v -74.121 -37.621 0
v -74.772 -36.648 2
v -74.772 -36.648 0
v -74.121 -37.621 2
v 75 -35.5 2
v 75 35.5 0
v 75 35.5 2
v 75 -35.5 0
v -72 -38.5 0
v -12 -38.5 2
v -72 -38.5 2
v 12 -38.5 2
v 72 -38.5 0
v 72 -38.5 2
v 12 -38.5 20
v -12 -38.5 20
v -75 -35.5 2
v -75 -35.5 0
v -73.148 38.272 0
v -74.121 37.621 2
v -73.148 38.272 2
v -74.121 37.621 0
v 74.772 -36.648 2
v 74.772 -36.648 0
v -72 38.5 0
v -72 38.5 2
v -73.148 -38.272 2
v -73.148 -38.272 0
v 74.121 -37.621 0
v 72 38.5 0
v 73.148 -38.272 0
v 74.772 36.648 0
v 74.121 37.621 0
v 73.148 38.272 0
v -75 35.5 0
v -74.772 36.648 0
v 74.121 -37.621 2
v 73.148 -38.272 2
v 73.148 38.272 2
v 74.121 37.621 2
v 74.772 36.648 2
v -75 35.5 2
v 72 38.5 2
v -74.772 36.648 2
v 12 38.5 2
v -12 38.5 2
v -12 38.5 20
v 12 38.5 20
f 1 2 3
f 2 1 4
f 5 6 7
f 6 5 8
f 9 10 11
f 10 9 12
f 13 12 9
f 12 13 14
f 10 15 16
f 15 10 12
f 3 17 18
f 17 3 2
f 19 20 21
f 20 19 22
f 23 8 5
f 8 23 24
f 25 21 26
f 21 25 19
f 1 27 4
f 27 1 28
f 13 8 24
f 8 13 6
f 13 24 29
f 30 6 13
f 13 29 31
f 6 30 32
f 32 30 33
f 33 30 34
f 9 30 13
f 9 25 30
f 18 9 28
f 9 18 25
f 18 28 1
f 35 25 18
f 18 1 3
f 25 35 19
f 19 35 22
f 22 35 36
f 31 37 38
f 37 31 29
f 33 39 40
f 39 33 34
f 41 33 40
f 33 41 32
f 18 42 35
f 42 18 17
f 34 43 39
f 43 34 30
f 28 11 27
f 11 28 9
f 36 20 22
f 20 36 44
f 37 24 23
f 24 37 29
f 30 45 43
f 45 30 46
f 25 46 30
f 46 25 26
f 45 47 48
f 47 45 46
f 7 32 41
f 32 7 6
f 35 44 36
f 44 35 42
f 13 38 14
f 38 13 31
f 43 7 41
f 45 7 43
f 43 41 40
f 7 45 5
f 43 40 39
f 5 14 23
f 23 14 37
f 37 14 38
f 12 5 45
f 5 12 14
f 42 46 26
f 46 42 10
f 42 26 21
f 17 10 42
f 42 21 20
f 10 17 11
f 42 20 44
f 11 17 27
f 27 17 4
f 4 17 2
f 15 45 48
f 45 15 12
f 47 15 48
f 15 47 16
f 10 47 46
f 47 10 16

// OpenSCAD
// file: actuators/act_kickup.scad
include <../parameter.scad>
strSpanB=10;
bodySlotX=100;
diameter=16;

//kickup(3);
//cap();

module kickup(orient){
$fn=32;

wall=2;
coilZ=15;
bottomZ=2;
t=0.3;
ySpacing=12;

bX = slotXY;
bY=ySpacing+diameter+wall;
bZ=coilZ+bottomZ+t;

tX = bX;
tY=bY;
hub=3;
magZ=3.1;
tbottomZ=3;
tZ=hub+magZ+tbottomZ;
tDia=6.7;//6.5;
screwTdia=4.3;

conMntX=2.54;
conMntY=6.3;
conMntZ=12;
conWt=1.5;

screwMdia=3;
screwMHDia=5.5;
screwMHh=1.8;
screwAdia=4.3;

mntTh=3;
mX=bX+slotXY+mntTh+0.3;


module mnt(){
difference(){
    union(){
        translate([-mX/2+bX/2,0,-mntTh])rcube([mX,bY,mntTh],3);
        translate([-mX+bX/2+mntTh/2,0,-mntTh])rcube([mntTh,bY,bZ+mntTh+tZ],0.1);
    }
    hull(){
    translate([-bX/2-slotXY,0,slotXY/2])rotate([0,-90,0])cylinder(d=m5Dia,h=bZ,center=true);
    translate([-bX/2-slotXY,0,(bZ+tZ)-m5Dia*1.5])rotate([0,-90,0])cylinder(d=m5Dia,h=bZ,center=true);
    }
    
    translate([0,bY/2-(bY-diameter)/4,-mntTh-0.01])cylinder(d2=screwMdia,d1=screwMHDia,h=screwMHh);
		translate([0,bY/2-(bY-diameter)/4,-mntTh-1])cylinder(d=screwMdia,h=mntTh*2);

    translate([0,-(bY/2-(bY-diameter)/4),-mntTh-0.01])cylinder(d2=screwMdia,d1=screwMHDia,h=screwMHh);
    translate([0,-(bY/2-(bY-diameter)/4),-mntTh-1])cylinder(d=screwMdia,h=bZ);
    
    translate([0,0,-mntTh-1])cylinder(d=screwMdia*2+4,h=bZ);
    translate([-bX/2+conMntX/2,0,0])cube([conMntX+conWt,conMntY+conWt,conMntZ],center=true);
}
}

module base(){
$fn=16;
cableDia=2;
difference(){
    union(){
        translate([0,0,0])rcube([bX,bY,bZ],3);
        //translate([bX/2+(conMntX+conWt)/2,0,0])rcube([conMntX+conWt,conMntY+conWt*2,conMntZ],0.1);  
    }

translate([bX/2-(conMntX)/2+1,0,0])rcube([conMntX+2,conMntY,conMntZ],0.1); 
translate([0,0,0]){
translate([0,0,bottomZ])rotate([0,0,30])cylinder(d=diameter,h=100,$fn=6);
translate([0,0,0])cylinder(d=screwAdia,h=100);
translate([0,0,conMntZ-cableDia/2])rotate([0,90,0])cylinder(d=cableDia,h=100);
}
translate([0,bY/2-(bY-diameter)/4,0])cylinder(d=screwMdia-0.2,h=bZ);
translate([0,-bY/2+(bY-diameter)/4,0])cylinder(d=screwMdia-0.2,h=bZ);
}
}

module top(){
$fn=16;
difference(){
translate([0,0,0])rcube([tX,tY,tZ],3);

translate([0,0,0]){

translate([0,0,-tbottomZ])cylinder(d=tDia,h=tZ);
cylinder(d=screwTdia,h=tZ);
}
translate([0,bY/2-(bY-diameter)/4,tZ])rotate([180,0,0])cylinder(d1=screwMHDia,d2=screwMdia,h=screwMHh);
translate([0,bY/2-(bY-diameter)/4,0])cylinder(d=screwMdia+0.3,h=tZ);
translate([0,-bY/2+(bY-diameter)/4,tZ])rotate([180,0,0])cylinder(d1=screwMHDia,d2=screwMdia,h=screwMHh);
translate([0,-bY/2+(bY-diameter)/4,0])cylinder(d=screwMdia+0.3,h=tZ);
}
}


module rcube(size,radius){
linear_extrude(height=size[2])
if(radius>0){
hull()
{
    // place 4 circles in the corners, with the given radius
    translate([(-size[0]/2)+(radius), (-size[1]/2)+(radius), 0])
    circle(r=radius);

    translate([(size[0]/2)-(radius), (-size[1]/2)+(radius), 0])
    circle(r=radius);

    translate([(-size[0]/2)+(radius), (size[1]/2)-(radius), 0])
    circle(r=radius);

    translate([(size[0]/2)-(radius), (size[1]/2)-(radius), 0])
    circle(r=radius);
}
}
if(radius==0){
translate([0,0,size[2]/2])cube(size,center=true);
}
}




module coil(){
$fn=32;
magholedia=4;
wallthick=0.5;
loweridlerZ=1.8;
upperidlerZ=1.8;
rampBZ=0.2;
rampTZ=0.2;
coildia=diameter-0.5;
rampdia=coildia;
threaddepth=5;
roofZ=loweridlerZ;

difference(){
union(){
cylinder(d=magholedia+wallthick*2,h=coilZ);
translate([0,0,loweridlerZ])cylinder(d1=rampdia,d2=magholedia+wallthick*2,h=rampBZ,$fn=6);
translate([0,0,coilZ-upperidlerZ-rampTZ])cylinder(d2=rampdia/100*100,d1=magholedia+wallthick*2,h=rampTZ,$fn=6);
translate([0,0,coilZ-upperidlerZ])cylinder(d=coildia/100*100,h=upperidlerZ,,$fn=6);
//Ccube([coildia,coildia,upperidlerZ],[0,0,1]);
translate([0,0,0]){
//Ccube([coildia,coildia,loweridlerZ],[0,0,1]);
cylinder(d=coildia,h=loweridlerZ,$fn=6);

}
}

translate([0,0,-roofZ])cylinder(d=magholedia,h=coilZ);
//cylinder(d=coilthreaddia,h=coilZ+1);
}}


if(orient==0){
translate([-slotXY/2,-(slotXY/2+bX/2),0])rotate([-90,0,-90]){
rotate([0,0,180]){
base();
translate([0,0,bZ])rotate([0,0,0])top();
}
mnt();
//translate([0,tY+0,0])rotate([30,0,0])rotate([0,90,0])coil();
}
}

if(orient==1){
base();
translate([0,tY+28,tZ])rotate([180,0,0])top();
translate([0,tY+0,0])rotate([30,0,0])rotate([0,90,0])coil();
}
if(orient==2){
translate([0,0,-bZ-tZ]){
rotate([0,0,180]){
base();
translate([0,0,bZ])rotate([0,0,0])top();
}
mnt();
//translate([0,tY+0,0])rotate([30,0,0])rotate([0,90,0])coil();
}
}

if(orient==3){
translate([0,0,0]){
mnt();
//translate([0,tY+0,0])rotate([30,0,0])rotate([0,90,0])coil();
}
}
}

module cap(){
i_dia=3.8;
o_dia=13.5;
	h=4;
$fn=32;
//headZ=4;
difference(){
union(){
difference(){
sphere(d=o_dia);
translate([0,0,-o_dia/2])cube([o_dia,o_dia,o_dia],center=true);}
translate([0,0,-h])cylinder(d=o_dia,h=h);
}
translate([0,0,-h])cylinder(d=i_dia,h=h+o_dia/3);
//scale([1,1,0.5])sphere(d=i_dia);
}
}
// file: parameter.scad
//----------------Global Parameter---------------------------------------
nema17_height=40;
nema17_width=42;
nema17_shftDia=5;
nema17_shftLen=28;
nema17_holeDist=31;
Nema17_gearDia=23;

slotWthick=4;
//-------Parameter triplePytho------------------------------------------------

strScale=800;
strDia=3.5;
strPosX=20;
strPosY=-20;
slotXY=20;
nStr=3;


tuner_bDi=8;
tuner_bDo=22.2;
tuner_bZ=10;
tuner_rThick=5;
tuner_tDia=strPosX*2;// (big)
//tuner_tDia=tuner_bDo+8;// (small)
tuner_leverZ=10;
tuner_zPos=225;
tuner_strDia=strDia[0];
tuner_leverY=35;

//----------Kickup----------------------------------------------------

kickup_baseX=17;
kickup_baseY=13;
kickup_zAdjDia=3.3;
kickup_zAdjL=10;
kickup_zAdjDist=10.5;
kickup_zAdjOff=4;
//------------------------------------------------------------------------

slide_cpDst=1.5;
slide_rackPosX=(55-12.5);

m3Dia=3.3;
m3NutD=6.6;
m4Dia=4.3;
m4NutD=8.3;
m4NutZ=5;
m5Dia=5.3;
m5HeadD=9.6;

edgeR=3;

mnt_pcbA_X=157;
mnt_pcbA_Y=101;

//---------End Parameter triplePytho-----------------------------------------------


//-------Parameter GHarp----------------------------------------------------

//strScale=650;
//strDia=3;
//strPosX=20;
//strPosY=-20;
//slotXY=20;
//nStr=3;
//
//
//
//tuner_bDi=8;
//tuner_bDo=22.2;
//tuner_bZ=10;
//tuner_rThick=5;
////tuner_tDia=strPosX*2; (big)
//tuner_tDia=strPosX*2-10;
//tuner_leverZ=10;
//tuner_zPos=225;
//tuner_strDia=strDia[0];
//tuner_leverY=35;
//
////----------Kickup----------------------------------------------------
//
//kickup_baseX=17;
//kickup_baseY=13;
//kickup_zAdjDia=3.3;
//kickup_zAdjL=10;
//kickup_zAdjDist=10.5;
//kickup_zAdjOff=4;
////------------------------------------------------------------------------
//
//slide_cpDst=1.5;
//slide_rackPosX=(55-12.5);
//
//m3Dia=3.3;
//m3NutD=6.6;
//m4Dia=4.3;
//m4NutD=8.3;
//m4NutZ=5;
//m5Dia=5.3;
//m5HeadD=9.6;
//
//edgeR=3;
//
//gearXPos=57;
//gearYPos=0;
//gearZPos=360;
//
//rackScrD=20;
//rack_X=13;
//rack_Y=15.5;
//rack_extOffX=0;
//
//bearGearD=25;
//mntGrD=20.5; //mount gear distance
//
//mnt_pcbA_X=157;
//mnt_pcbA_Y=101;

//---------End Parameter GHarp-----------------------------------------------


//-------Parameter Bass----------------------------------------------------

//strScale=650;
//strDia=4;
//strPosX=20;
//strPosY=-20;
//slotXY=20;
//
//
//
//tuner_bDi=8;
//tuner_bDo=22.2;
//tuner_bZ=10;
//tuner_rThick=5;
////tuner_tDia=strPosX*2; (big)
//tuner_tDia=strPosX*2;
//tuner_leverZ=10;
//tuner_zPos=225;
//tuner_strDia=strDia[0];
//tuner_leverY=35;
//
////----------Kickup----------------------------------------------------
//
//
//kickup_baseX=22;
//kickup_baseY=15;
//kickup_zAdjDia=3.3;
//kickup_zAdjL=10;
//kickup_zAdjDist=13;
//kickup_zAdjOff=4;
//
//
//slide_cpDst=1.5;
//slide_rackPosX=(55-12.5);
//
//m3NutD=6.6;
//m4Dia=4.3;
//m4NutD=8.3;
//m5Dia=5.3;
//
//edgeR=3;
//
//gearXPos=57;
//gearYPos=0;
//gearZPos=360;
//
//rackScrD=20;
//rack_X=13;
//rack_Y=15.5;
//rack_extOffX=0;
//
//bearGearD=25;
//mntGrD=20.5; //mount gear distance
//
////---------End Bass-----------------------------------------------
// file: libs/T-Slot.scad
/** 
 * @file
 * Generic library for fractional T-Slot extrusions.
 *
 * Creative Commons Share Alike 3.0
 * Copyright (c) 2014 Manuel García
 *
 * Original library (David Lee Miller)
 * https://www.thingiverse.com/thing:136430
 */ 

ProfileCore = 4.3;     // Profile core Ø (Default M5).
minkR_TS = 0.04 * 20;  // Minkowski radius for the T-Slot.
minkR_IC = 0.075 * 20; // Minkowski radius for the inner cutout.
minkR_PF = 0.05 * 20;  // Minkowski radius for the profile corners.

//2020Profile(100);
//2040Profile(100);
//2060Profile(100);
//2080Profile(100);
//4040Profile(100);
//4060Profile(100);
//4080Profile(100);

module fillet(rad) {
  translate([-rad, -rad, 0])
  difference() {
    translate([0, 0, 0]) square([rad + 0.01, rad + 0.01]);
    circle(r = rad, $fn = 32);
  }
}

module insideCutout() {
  minkowski() {
    translate([0, 0, 0]) circle(r = minkR_IC, center = true, $fn = 32);
    hull() {
      square([0.2 * 20 - minkR_IC, 0.645 * 20 - 2 * minkR_IC], center = true);
      square([0.8 * 20 - 2 * minkR_IC, 0.001 * 20], center = true);
    }
  }
}

module doubleCutout() {
  union() {
    minkowski() {
      translate([0, 0, 0]) circle(r = minkR_IC, center = true, $fn = 32);
      union() {
        rotate([0, 0, 0]) hull() {
          translate([-0.5 * 20, 0, 0]) hull() {
            square([0.2 * 20 - minkR_IC, 0.645 * 20 - 2 * minkR_IC], center = true);
            square([0.8 * 20 - 2 * minkR_IC, 0.001 * 20], center = true);
          }
          translate([0.5 * 20, 0, 0]) hull() {
            square([0.2 * 20 - minkR_IC, 0.645 * 20 - 2 * minkR_IC], center = true);
            square([0.8 * 20 - 2 * minkR_IC, 0.001 * 20], center = true);
          }
        }
        rotate([0, 0, 90]) hull() {
          translate([-0.5 * 20, 0, 0]) hull() {
            square([0.2 * 20 - minkR_IC, 0.645 * 20 - 2 * minkR_IC], center = true);
            square([0.8 * 20 - 2 * minkR_IC, 0.001 * 20], center = true);
          }
          translate([0.5 * 20, 0, 0]) hull() {
            square([0.2 * 20 - minkR_IC, 0.645 * 20 - 2 * minkR_IC], center = true);
            square([0.8 * 20 - 2 * minkR_IC, 0.001 * 20], center = true);
          }
        }
      }
    }
    rotate([0, 0, 0]) translate([-0.645 * 20 / 2, -0.645 * 20 / 2, 0]) fillet(minkR_IC);
    rotate([0, 0, 180]) translate([-0.645 * 20 / 2, -0.645 * 20 / 2, 0]) fillet(minkR_IC);
    rotate([0, 0, 90]) translate([-0.645 * 20 / 2, -0.645 * 20 / 2, 0]) fillet(minkR_IC);
    rotate([0, 0, -90]) translate([-0.645 * 20 / 2, -0.645 * 20 / 2, 0]) fillet(minkR_IC);
  }
}

module tSlot() {
  union() {
    translate([minkR_TS, 0, 0])
    minkowski() {
      translate([0, 0, 0]) circle(r = minkR_TS, $fn = 32);
      hull() {
        square([0.001 * 20, 0.585 * 20 - 2 * minkR_TS], center = true);
        translate([(0.233 * 20 - 2 * minkR_TS) / 2, 0, 0]) square([0.233 * 20 - 2 * minkR_TS, 0.2 * 20], center = true);
      }
    }
    translate([-0.255 * 20 / 2 + 0.01, 0, 0]) square(0.255 * 20, center = true);
    translate([-0.35 * 20 / 2 - 0.087 * 20 + 0.01, 0, 0]) square(0.35 * 20, center = true);
    translate([0, -0.255 * 20 / 2, 0]) fillet(minkR_TS / 2);
    translate([-0.087 * 20, -0.255 * 20 / 2, 0]) rotate([0, 0, 90]) fillet(minkR_TS / 2);
    scale([1, -1, 1]) translate([0, -0.255 * 20 / 2, 0]) fillet(minkR_TS / 2);
    scale([1, -1, 1]) translate([-0.087 * 20, -0.255 * 20 / 2, 0]) rotate([0, 0, 90]) fillet(minkR_TS / 2);
  }
}

module 2020Profile(height, core = ProfileCore) {
  linear_extrude(height = height, center = true)
  union() {
    difference() {
      minkowski() {
        translate([0, 0, 0]) circle(r = minkR_PF, $fn = 32);
        square([1 * 20 - 2 * minkR_PF, 1 * 20 - 2 * minkR_PF], center = true);
      }
      translate([0, 0, 0]) circle(r = core / 2, $fn = 24);
      translate([-0.5 * 20 + 0.087 * 20, 0, 0]) tSlot();
      rotate([0, 0, 180]) translate([-0.5 * 20 + 0.087 * 20, 0, 0]) tSlot();
      translate([0, -0.5 * 20 + 0.087 * 20, 0]) rotate([0, 0, 90]) tSlot();
      translate([0, 0.5 * 20 - 0.087 * 20, 0]) rotate([0, 0, -90]) tSlot();
    }
  }
}
// main file
include <libs/T-Slot.scad>
//use <libs/Nema17.scad>
//include <libs/gearRack.scad>
//include <libs/linearBearing.scad>

include <parameter.scad>
//include <string/bridgeV2.scad>
//include <string/tuner.scad>
include <actuators/act_kickup.scad>
//include <actuators/act_Pick.scad>
//include <actuators/act_motor.scad>
//include <actuators/act_drumroll.scad>
//use <mount/stand_A.scad>


slotWH=20;
slotAH=500;
slotBH=250;
drmDia=375;
drmH=120;
slotADist=200;
slotWT = 4; //slot wall thickness 

difference(){
	//cylinder(d=drmDia, h=drmH);
	//translate([0,0,drmH-10])cylinder(d=drmDia-10, h=drmH);
}

//translate([slotADist/2,-slotAH/2,-slotWH/2])rotate([-90,0,0])rcube([slotWH,slotWH,slotAH],1);
//translate([-slotADist/2,-slotAH/2,-slotWH/2])rotate([-90,0,0])rcube([slotWH,slotWH,slotAH],1);
//translate([slotADist/2,-slotAH/2,slotWH/2+drmH])rotate([-90,0,0])rcube([slotWH,slotWH,slotAH],1);
//translate([-slotADist/2,-slotAH/2,slotWH/2+drmH])rotate([-90,0,0])rcube([slotWH,slotWH,slotAH],1);
//
//translate([slotBH/2,(drmDia/2+slotWH/2+5),-slotWH/2+drmH])rotate([0,-90,0])rcube([slotWH,slotWH,slotBH],1);
//translate([slotBH/2,-(drmDia/2+slotWH/2+5),-slotWH/2+drmH])rotate([0,-90,0])rcube([slotWH,slotWH,slotBH],1);

//translate([0,-slotAH/2,slotWH/2+drmH+10])rotate([-90,0,0])rcube([slotWH,slotWH,slotAH],1);

//translate([0,0,0])drmClmp();

//translate([0,90,145])rotate([0,90,90])kickup(0);
//translate([0,0,250])rotate([0,90,90])palm();

//put_together();
pcbMnt();

module put_together(){
	translate([0,0,0])drmClmp();
	translate([0,90,0])rotate([0,90,90])kickup(0); 
}
	
module pcbMnt(){
    pcbW =150;
    pcbD = 77;
    w = pcbW;
    d = pcbD;
    bttmH = 2;
    rcube([pcbW,pcbD,bttmH],3);
    
    translate([0,0,0]) rcube([slotWH+slotWT,d,slotWH],0);
}
module drmClmp(){
	$fa = 3;
	w=100;
	d=4;
	hB=12;
	doW=400;
	angle=30;
	ovrSnr=10;
	wt=2.5;
	scrwADia=5;
	scrwBDia=8;
	

	
	difference(){
			rcube([slotWH*2.5,slotWH,slotWH+wt*2],3);
			translate([0,slotWH,slotWH/2+wt])rotate([90,0,0])rcube([slotWH+0.1,slotWH+0.1,slotWH*2],1);
			translate([0,0,0])cylinder(d=scrwADia+0.3, h=slotWH*2);
			translate([-slotWH*0.875,0,0])cylinder(d=scrwBDia+0.1, h=slotWH*2);
			translate([slotWH*0.875,0,0])cylinder(d=scrwBDia+0.1, h=slotWH*2);
	}
	translate([0,0,-20]){
			difference(){
					rcube([slotWH*4,slotWH,hB],3);
					translate([-slotWH*0.875,0,0])cylinder(d=scrwBDia-0.4, h=slotWH*2);
					translate([slotWH*0.875,0,0])cylinder(d=scrwBDia-0.4, h=slotWH*2);
					translate([-slotWH*1.5,0,hB/2])rotate([90,0,0])cylinder(d=scrwBDia-0.4, h=slotWH*2,center=true);
					translate([slotWH*1.5,0,hB/2])rotate([90,0,0])cylinder(d=scrwBDia-0.4, h=slotWH*2,center=true);
			}
	}
	
	difference(){
			//translate([0,-d/2, 0])rcube([w,d,hA],5);
			//translate([0,0,0])rotate([0,0,-angle/2+90])rotate_extrude(angle=angle)translate([doW/2,0, 0])square([hA,hA]);
			//translate([0,0, hA])rotate([0,0,-(angle+2)/2+90])rotate_extrude(angle=angle+2)translate([doW/2-hA+20,0, 0])circle(d=hA*2);
	}
	//translate([0,0, hA])rotate([0,0,-angle/2+90])rotate_extrude(angle=angle)translate([doW/2-ovrSnr,0, 0])square([hA+ovrSnr,hB]);
}

module rcube(size,radius){
  $fn=16;
  linear_extrude(height=size[2])
  if(radius>0){
  hull()
  {
      // place 4 circles in the corners, with the given radius
      translate([(-size[0]/2)+(radius), (-size[1]/2)+(radius), 0])
      circle(r=radius);

      translate([(size[0]/2)-(radius), (-size[1]/2)+(radius), 0])
      circle(r=radius);

      translate([(-size[0]/2)+(radius), (size[1]/2)-(radius), 0])
      circle(r=radius);

      translate([(size[0]/2)-(radius), (size[1]/2)-(radius), 0])
      circle(r=radius);
  }
  }
  if(radius==0){
    translate([0,0,size[2]/2])cube(size,center=true);
  }
}
